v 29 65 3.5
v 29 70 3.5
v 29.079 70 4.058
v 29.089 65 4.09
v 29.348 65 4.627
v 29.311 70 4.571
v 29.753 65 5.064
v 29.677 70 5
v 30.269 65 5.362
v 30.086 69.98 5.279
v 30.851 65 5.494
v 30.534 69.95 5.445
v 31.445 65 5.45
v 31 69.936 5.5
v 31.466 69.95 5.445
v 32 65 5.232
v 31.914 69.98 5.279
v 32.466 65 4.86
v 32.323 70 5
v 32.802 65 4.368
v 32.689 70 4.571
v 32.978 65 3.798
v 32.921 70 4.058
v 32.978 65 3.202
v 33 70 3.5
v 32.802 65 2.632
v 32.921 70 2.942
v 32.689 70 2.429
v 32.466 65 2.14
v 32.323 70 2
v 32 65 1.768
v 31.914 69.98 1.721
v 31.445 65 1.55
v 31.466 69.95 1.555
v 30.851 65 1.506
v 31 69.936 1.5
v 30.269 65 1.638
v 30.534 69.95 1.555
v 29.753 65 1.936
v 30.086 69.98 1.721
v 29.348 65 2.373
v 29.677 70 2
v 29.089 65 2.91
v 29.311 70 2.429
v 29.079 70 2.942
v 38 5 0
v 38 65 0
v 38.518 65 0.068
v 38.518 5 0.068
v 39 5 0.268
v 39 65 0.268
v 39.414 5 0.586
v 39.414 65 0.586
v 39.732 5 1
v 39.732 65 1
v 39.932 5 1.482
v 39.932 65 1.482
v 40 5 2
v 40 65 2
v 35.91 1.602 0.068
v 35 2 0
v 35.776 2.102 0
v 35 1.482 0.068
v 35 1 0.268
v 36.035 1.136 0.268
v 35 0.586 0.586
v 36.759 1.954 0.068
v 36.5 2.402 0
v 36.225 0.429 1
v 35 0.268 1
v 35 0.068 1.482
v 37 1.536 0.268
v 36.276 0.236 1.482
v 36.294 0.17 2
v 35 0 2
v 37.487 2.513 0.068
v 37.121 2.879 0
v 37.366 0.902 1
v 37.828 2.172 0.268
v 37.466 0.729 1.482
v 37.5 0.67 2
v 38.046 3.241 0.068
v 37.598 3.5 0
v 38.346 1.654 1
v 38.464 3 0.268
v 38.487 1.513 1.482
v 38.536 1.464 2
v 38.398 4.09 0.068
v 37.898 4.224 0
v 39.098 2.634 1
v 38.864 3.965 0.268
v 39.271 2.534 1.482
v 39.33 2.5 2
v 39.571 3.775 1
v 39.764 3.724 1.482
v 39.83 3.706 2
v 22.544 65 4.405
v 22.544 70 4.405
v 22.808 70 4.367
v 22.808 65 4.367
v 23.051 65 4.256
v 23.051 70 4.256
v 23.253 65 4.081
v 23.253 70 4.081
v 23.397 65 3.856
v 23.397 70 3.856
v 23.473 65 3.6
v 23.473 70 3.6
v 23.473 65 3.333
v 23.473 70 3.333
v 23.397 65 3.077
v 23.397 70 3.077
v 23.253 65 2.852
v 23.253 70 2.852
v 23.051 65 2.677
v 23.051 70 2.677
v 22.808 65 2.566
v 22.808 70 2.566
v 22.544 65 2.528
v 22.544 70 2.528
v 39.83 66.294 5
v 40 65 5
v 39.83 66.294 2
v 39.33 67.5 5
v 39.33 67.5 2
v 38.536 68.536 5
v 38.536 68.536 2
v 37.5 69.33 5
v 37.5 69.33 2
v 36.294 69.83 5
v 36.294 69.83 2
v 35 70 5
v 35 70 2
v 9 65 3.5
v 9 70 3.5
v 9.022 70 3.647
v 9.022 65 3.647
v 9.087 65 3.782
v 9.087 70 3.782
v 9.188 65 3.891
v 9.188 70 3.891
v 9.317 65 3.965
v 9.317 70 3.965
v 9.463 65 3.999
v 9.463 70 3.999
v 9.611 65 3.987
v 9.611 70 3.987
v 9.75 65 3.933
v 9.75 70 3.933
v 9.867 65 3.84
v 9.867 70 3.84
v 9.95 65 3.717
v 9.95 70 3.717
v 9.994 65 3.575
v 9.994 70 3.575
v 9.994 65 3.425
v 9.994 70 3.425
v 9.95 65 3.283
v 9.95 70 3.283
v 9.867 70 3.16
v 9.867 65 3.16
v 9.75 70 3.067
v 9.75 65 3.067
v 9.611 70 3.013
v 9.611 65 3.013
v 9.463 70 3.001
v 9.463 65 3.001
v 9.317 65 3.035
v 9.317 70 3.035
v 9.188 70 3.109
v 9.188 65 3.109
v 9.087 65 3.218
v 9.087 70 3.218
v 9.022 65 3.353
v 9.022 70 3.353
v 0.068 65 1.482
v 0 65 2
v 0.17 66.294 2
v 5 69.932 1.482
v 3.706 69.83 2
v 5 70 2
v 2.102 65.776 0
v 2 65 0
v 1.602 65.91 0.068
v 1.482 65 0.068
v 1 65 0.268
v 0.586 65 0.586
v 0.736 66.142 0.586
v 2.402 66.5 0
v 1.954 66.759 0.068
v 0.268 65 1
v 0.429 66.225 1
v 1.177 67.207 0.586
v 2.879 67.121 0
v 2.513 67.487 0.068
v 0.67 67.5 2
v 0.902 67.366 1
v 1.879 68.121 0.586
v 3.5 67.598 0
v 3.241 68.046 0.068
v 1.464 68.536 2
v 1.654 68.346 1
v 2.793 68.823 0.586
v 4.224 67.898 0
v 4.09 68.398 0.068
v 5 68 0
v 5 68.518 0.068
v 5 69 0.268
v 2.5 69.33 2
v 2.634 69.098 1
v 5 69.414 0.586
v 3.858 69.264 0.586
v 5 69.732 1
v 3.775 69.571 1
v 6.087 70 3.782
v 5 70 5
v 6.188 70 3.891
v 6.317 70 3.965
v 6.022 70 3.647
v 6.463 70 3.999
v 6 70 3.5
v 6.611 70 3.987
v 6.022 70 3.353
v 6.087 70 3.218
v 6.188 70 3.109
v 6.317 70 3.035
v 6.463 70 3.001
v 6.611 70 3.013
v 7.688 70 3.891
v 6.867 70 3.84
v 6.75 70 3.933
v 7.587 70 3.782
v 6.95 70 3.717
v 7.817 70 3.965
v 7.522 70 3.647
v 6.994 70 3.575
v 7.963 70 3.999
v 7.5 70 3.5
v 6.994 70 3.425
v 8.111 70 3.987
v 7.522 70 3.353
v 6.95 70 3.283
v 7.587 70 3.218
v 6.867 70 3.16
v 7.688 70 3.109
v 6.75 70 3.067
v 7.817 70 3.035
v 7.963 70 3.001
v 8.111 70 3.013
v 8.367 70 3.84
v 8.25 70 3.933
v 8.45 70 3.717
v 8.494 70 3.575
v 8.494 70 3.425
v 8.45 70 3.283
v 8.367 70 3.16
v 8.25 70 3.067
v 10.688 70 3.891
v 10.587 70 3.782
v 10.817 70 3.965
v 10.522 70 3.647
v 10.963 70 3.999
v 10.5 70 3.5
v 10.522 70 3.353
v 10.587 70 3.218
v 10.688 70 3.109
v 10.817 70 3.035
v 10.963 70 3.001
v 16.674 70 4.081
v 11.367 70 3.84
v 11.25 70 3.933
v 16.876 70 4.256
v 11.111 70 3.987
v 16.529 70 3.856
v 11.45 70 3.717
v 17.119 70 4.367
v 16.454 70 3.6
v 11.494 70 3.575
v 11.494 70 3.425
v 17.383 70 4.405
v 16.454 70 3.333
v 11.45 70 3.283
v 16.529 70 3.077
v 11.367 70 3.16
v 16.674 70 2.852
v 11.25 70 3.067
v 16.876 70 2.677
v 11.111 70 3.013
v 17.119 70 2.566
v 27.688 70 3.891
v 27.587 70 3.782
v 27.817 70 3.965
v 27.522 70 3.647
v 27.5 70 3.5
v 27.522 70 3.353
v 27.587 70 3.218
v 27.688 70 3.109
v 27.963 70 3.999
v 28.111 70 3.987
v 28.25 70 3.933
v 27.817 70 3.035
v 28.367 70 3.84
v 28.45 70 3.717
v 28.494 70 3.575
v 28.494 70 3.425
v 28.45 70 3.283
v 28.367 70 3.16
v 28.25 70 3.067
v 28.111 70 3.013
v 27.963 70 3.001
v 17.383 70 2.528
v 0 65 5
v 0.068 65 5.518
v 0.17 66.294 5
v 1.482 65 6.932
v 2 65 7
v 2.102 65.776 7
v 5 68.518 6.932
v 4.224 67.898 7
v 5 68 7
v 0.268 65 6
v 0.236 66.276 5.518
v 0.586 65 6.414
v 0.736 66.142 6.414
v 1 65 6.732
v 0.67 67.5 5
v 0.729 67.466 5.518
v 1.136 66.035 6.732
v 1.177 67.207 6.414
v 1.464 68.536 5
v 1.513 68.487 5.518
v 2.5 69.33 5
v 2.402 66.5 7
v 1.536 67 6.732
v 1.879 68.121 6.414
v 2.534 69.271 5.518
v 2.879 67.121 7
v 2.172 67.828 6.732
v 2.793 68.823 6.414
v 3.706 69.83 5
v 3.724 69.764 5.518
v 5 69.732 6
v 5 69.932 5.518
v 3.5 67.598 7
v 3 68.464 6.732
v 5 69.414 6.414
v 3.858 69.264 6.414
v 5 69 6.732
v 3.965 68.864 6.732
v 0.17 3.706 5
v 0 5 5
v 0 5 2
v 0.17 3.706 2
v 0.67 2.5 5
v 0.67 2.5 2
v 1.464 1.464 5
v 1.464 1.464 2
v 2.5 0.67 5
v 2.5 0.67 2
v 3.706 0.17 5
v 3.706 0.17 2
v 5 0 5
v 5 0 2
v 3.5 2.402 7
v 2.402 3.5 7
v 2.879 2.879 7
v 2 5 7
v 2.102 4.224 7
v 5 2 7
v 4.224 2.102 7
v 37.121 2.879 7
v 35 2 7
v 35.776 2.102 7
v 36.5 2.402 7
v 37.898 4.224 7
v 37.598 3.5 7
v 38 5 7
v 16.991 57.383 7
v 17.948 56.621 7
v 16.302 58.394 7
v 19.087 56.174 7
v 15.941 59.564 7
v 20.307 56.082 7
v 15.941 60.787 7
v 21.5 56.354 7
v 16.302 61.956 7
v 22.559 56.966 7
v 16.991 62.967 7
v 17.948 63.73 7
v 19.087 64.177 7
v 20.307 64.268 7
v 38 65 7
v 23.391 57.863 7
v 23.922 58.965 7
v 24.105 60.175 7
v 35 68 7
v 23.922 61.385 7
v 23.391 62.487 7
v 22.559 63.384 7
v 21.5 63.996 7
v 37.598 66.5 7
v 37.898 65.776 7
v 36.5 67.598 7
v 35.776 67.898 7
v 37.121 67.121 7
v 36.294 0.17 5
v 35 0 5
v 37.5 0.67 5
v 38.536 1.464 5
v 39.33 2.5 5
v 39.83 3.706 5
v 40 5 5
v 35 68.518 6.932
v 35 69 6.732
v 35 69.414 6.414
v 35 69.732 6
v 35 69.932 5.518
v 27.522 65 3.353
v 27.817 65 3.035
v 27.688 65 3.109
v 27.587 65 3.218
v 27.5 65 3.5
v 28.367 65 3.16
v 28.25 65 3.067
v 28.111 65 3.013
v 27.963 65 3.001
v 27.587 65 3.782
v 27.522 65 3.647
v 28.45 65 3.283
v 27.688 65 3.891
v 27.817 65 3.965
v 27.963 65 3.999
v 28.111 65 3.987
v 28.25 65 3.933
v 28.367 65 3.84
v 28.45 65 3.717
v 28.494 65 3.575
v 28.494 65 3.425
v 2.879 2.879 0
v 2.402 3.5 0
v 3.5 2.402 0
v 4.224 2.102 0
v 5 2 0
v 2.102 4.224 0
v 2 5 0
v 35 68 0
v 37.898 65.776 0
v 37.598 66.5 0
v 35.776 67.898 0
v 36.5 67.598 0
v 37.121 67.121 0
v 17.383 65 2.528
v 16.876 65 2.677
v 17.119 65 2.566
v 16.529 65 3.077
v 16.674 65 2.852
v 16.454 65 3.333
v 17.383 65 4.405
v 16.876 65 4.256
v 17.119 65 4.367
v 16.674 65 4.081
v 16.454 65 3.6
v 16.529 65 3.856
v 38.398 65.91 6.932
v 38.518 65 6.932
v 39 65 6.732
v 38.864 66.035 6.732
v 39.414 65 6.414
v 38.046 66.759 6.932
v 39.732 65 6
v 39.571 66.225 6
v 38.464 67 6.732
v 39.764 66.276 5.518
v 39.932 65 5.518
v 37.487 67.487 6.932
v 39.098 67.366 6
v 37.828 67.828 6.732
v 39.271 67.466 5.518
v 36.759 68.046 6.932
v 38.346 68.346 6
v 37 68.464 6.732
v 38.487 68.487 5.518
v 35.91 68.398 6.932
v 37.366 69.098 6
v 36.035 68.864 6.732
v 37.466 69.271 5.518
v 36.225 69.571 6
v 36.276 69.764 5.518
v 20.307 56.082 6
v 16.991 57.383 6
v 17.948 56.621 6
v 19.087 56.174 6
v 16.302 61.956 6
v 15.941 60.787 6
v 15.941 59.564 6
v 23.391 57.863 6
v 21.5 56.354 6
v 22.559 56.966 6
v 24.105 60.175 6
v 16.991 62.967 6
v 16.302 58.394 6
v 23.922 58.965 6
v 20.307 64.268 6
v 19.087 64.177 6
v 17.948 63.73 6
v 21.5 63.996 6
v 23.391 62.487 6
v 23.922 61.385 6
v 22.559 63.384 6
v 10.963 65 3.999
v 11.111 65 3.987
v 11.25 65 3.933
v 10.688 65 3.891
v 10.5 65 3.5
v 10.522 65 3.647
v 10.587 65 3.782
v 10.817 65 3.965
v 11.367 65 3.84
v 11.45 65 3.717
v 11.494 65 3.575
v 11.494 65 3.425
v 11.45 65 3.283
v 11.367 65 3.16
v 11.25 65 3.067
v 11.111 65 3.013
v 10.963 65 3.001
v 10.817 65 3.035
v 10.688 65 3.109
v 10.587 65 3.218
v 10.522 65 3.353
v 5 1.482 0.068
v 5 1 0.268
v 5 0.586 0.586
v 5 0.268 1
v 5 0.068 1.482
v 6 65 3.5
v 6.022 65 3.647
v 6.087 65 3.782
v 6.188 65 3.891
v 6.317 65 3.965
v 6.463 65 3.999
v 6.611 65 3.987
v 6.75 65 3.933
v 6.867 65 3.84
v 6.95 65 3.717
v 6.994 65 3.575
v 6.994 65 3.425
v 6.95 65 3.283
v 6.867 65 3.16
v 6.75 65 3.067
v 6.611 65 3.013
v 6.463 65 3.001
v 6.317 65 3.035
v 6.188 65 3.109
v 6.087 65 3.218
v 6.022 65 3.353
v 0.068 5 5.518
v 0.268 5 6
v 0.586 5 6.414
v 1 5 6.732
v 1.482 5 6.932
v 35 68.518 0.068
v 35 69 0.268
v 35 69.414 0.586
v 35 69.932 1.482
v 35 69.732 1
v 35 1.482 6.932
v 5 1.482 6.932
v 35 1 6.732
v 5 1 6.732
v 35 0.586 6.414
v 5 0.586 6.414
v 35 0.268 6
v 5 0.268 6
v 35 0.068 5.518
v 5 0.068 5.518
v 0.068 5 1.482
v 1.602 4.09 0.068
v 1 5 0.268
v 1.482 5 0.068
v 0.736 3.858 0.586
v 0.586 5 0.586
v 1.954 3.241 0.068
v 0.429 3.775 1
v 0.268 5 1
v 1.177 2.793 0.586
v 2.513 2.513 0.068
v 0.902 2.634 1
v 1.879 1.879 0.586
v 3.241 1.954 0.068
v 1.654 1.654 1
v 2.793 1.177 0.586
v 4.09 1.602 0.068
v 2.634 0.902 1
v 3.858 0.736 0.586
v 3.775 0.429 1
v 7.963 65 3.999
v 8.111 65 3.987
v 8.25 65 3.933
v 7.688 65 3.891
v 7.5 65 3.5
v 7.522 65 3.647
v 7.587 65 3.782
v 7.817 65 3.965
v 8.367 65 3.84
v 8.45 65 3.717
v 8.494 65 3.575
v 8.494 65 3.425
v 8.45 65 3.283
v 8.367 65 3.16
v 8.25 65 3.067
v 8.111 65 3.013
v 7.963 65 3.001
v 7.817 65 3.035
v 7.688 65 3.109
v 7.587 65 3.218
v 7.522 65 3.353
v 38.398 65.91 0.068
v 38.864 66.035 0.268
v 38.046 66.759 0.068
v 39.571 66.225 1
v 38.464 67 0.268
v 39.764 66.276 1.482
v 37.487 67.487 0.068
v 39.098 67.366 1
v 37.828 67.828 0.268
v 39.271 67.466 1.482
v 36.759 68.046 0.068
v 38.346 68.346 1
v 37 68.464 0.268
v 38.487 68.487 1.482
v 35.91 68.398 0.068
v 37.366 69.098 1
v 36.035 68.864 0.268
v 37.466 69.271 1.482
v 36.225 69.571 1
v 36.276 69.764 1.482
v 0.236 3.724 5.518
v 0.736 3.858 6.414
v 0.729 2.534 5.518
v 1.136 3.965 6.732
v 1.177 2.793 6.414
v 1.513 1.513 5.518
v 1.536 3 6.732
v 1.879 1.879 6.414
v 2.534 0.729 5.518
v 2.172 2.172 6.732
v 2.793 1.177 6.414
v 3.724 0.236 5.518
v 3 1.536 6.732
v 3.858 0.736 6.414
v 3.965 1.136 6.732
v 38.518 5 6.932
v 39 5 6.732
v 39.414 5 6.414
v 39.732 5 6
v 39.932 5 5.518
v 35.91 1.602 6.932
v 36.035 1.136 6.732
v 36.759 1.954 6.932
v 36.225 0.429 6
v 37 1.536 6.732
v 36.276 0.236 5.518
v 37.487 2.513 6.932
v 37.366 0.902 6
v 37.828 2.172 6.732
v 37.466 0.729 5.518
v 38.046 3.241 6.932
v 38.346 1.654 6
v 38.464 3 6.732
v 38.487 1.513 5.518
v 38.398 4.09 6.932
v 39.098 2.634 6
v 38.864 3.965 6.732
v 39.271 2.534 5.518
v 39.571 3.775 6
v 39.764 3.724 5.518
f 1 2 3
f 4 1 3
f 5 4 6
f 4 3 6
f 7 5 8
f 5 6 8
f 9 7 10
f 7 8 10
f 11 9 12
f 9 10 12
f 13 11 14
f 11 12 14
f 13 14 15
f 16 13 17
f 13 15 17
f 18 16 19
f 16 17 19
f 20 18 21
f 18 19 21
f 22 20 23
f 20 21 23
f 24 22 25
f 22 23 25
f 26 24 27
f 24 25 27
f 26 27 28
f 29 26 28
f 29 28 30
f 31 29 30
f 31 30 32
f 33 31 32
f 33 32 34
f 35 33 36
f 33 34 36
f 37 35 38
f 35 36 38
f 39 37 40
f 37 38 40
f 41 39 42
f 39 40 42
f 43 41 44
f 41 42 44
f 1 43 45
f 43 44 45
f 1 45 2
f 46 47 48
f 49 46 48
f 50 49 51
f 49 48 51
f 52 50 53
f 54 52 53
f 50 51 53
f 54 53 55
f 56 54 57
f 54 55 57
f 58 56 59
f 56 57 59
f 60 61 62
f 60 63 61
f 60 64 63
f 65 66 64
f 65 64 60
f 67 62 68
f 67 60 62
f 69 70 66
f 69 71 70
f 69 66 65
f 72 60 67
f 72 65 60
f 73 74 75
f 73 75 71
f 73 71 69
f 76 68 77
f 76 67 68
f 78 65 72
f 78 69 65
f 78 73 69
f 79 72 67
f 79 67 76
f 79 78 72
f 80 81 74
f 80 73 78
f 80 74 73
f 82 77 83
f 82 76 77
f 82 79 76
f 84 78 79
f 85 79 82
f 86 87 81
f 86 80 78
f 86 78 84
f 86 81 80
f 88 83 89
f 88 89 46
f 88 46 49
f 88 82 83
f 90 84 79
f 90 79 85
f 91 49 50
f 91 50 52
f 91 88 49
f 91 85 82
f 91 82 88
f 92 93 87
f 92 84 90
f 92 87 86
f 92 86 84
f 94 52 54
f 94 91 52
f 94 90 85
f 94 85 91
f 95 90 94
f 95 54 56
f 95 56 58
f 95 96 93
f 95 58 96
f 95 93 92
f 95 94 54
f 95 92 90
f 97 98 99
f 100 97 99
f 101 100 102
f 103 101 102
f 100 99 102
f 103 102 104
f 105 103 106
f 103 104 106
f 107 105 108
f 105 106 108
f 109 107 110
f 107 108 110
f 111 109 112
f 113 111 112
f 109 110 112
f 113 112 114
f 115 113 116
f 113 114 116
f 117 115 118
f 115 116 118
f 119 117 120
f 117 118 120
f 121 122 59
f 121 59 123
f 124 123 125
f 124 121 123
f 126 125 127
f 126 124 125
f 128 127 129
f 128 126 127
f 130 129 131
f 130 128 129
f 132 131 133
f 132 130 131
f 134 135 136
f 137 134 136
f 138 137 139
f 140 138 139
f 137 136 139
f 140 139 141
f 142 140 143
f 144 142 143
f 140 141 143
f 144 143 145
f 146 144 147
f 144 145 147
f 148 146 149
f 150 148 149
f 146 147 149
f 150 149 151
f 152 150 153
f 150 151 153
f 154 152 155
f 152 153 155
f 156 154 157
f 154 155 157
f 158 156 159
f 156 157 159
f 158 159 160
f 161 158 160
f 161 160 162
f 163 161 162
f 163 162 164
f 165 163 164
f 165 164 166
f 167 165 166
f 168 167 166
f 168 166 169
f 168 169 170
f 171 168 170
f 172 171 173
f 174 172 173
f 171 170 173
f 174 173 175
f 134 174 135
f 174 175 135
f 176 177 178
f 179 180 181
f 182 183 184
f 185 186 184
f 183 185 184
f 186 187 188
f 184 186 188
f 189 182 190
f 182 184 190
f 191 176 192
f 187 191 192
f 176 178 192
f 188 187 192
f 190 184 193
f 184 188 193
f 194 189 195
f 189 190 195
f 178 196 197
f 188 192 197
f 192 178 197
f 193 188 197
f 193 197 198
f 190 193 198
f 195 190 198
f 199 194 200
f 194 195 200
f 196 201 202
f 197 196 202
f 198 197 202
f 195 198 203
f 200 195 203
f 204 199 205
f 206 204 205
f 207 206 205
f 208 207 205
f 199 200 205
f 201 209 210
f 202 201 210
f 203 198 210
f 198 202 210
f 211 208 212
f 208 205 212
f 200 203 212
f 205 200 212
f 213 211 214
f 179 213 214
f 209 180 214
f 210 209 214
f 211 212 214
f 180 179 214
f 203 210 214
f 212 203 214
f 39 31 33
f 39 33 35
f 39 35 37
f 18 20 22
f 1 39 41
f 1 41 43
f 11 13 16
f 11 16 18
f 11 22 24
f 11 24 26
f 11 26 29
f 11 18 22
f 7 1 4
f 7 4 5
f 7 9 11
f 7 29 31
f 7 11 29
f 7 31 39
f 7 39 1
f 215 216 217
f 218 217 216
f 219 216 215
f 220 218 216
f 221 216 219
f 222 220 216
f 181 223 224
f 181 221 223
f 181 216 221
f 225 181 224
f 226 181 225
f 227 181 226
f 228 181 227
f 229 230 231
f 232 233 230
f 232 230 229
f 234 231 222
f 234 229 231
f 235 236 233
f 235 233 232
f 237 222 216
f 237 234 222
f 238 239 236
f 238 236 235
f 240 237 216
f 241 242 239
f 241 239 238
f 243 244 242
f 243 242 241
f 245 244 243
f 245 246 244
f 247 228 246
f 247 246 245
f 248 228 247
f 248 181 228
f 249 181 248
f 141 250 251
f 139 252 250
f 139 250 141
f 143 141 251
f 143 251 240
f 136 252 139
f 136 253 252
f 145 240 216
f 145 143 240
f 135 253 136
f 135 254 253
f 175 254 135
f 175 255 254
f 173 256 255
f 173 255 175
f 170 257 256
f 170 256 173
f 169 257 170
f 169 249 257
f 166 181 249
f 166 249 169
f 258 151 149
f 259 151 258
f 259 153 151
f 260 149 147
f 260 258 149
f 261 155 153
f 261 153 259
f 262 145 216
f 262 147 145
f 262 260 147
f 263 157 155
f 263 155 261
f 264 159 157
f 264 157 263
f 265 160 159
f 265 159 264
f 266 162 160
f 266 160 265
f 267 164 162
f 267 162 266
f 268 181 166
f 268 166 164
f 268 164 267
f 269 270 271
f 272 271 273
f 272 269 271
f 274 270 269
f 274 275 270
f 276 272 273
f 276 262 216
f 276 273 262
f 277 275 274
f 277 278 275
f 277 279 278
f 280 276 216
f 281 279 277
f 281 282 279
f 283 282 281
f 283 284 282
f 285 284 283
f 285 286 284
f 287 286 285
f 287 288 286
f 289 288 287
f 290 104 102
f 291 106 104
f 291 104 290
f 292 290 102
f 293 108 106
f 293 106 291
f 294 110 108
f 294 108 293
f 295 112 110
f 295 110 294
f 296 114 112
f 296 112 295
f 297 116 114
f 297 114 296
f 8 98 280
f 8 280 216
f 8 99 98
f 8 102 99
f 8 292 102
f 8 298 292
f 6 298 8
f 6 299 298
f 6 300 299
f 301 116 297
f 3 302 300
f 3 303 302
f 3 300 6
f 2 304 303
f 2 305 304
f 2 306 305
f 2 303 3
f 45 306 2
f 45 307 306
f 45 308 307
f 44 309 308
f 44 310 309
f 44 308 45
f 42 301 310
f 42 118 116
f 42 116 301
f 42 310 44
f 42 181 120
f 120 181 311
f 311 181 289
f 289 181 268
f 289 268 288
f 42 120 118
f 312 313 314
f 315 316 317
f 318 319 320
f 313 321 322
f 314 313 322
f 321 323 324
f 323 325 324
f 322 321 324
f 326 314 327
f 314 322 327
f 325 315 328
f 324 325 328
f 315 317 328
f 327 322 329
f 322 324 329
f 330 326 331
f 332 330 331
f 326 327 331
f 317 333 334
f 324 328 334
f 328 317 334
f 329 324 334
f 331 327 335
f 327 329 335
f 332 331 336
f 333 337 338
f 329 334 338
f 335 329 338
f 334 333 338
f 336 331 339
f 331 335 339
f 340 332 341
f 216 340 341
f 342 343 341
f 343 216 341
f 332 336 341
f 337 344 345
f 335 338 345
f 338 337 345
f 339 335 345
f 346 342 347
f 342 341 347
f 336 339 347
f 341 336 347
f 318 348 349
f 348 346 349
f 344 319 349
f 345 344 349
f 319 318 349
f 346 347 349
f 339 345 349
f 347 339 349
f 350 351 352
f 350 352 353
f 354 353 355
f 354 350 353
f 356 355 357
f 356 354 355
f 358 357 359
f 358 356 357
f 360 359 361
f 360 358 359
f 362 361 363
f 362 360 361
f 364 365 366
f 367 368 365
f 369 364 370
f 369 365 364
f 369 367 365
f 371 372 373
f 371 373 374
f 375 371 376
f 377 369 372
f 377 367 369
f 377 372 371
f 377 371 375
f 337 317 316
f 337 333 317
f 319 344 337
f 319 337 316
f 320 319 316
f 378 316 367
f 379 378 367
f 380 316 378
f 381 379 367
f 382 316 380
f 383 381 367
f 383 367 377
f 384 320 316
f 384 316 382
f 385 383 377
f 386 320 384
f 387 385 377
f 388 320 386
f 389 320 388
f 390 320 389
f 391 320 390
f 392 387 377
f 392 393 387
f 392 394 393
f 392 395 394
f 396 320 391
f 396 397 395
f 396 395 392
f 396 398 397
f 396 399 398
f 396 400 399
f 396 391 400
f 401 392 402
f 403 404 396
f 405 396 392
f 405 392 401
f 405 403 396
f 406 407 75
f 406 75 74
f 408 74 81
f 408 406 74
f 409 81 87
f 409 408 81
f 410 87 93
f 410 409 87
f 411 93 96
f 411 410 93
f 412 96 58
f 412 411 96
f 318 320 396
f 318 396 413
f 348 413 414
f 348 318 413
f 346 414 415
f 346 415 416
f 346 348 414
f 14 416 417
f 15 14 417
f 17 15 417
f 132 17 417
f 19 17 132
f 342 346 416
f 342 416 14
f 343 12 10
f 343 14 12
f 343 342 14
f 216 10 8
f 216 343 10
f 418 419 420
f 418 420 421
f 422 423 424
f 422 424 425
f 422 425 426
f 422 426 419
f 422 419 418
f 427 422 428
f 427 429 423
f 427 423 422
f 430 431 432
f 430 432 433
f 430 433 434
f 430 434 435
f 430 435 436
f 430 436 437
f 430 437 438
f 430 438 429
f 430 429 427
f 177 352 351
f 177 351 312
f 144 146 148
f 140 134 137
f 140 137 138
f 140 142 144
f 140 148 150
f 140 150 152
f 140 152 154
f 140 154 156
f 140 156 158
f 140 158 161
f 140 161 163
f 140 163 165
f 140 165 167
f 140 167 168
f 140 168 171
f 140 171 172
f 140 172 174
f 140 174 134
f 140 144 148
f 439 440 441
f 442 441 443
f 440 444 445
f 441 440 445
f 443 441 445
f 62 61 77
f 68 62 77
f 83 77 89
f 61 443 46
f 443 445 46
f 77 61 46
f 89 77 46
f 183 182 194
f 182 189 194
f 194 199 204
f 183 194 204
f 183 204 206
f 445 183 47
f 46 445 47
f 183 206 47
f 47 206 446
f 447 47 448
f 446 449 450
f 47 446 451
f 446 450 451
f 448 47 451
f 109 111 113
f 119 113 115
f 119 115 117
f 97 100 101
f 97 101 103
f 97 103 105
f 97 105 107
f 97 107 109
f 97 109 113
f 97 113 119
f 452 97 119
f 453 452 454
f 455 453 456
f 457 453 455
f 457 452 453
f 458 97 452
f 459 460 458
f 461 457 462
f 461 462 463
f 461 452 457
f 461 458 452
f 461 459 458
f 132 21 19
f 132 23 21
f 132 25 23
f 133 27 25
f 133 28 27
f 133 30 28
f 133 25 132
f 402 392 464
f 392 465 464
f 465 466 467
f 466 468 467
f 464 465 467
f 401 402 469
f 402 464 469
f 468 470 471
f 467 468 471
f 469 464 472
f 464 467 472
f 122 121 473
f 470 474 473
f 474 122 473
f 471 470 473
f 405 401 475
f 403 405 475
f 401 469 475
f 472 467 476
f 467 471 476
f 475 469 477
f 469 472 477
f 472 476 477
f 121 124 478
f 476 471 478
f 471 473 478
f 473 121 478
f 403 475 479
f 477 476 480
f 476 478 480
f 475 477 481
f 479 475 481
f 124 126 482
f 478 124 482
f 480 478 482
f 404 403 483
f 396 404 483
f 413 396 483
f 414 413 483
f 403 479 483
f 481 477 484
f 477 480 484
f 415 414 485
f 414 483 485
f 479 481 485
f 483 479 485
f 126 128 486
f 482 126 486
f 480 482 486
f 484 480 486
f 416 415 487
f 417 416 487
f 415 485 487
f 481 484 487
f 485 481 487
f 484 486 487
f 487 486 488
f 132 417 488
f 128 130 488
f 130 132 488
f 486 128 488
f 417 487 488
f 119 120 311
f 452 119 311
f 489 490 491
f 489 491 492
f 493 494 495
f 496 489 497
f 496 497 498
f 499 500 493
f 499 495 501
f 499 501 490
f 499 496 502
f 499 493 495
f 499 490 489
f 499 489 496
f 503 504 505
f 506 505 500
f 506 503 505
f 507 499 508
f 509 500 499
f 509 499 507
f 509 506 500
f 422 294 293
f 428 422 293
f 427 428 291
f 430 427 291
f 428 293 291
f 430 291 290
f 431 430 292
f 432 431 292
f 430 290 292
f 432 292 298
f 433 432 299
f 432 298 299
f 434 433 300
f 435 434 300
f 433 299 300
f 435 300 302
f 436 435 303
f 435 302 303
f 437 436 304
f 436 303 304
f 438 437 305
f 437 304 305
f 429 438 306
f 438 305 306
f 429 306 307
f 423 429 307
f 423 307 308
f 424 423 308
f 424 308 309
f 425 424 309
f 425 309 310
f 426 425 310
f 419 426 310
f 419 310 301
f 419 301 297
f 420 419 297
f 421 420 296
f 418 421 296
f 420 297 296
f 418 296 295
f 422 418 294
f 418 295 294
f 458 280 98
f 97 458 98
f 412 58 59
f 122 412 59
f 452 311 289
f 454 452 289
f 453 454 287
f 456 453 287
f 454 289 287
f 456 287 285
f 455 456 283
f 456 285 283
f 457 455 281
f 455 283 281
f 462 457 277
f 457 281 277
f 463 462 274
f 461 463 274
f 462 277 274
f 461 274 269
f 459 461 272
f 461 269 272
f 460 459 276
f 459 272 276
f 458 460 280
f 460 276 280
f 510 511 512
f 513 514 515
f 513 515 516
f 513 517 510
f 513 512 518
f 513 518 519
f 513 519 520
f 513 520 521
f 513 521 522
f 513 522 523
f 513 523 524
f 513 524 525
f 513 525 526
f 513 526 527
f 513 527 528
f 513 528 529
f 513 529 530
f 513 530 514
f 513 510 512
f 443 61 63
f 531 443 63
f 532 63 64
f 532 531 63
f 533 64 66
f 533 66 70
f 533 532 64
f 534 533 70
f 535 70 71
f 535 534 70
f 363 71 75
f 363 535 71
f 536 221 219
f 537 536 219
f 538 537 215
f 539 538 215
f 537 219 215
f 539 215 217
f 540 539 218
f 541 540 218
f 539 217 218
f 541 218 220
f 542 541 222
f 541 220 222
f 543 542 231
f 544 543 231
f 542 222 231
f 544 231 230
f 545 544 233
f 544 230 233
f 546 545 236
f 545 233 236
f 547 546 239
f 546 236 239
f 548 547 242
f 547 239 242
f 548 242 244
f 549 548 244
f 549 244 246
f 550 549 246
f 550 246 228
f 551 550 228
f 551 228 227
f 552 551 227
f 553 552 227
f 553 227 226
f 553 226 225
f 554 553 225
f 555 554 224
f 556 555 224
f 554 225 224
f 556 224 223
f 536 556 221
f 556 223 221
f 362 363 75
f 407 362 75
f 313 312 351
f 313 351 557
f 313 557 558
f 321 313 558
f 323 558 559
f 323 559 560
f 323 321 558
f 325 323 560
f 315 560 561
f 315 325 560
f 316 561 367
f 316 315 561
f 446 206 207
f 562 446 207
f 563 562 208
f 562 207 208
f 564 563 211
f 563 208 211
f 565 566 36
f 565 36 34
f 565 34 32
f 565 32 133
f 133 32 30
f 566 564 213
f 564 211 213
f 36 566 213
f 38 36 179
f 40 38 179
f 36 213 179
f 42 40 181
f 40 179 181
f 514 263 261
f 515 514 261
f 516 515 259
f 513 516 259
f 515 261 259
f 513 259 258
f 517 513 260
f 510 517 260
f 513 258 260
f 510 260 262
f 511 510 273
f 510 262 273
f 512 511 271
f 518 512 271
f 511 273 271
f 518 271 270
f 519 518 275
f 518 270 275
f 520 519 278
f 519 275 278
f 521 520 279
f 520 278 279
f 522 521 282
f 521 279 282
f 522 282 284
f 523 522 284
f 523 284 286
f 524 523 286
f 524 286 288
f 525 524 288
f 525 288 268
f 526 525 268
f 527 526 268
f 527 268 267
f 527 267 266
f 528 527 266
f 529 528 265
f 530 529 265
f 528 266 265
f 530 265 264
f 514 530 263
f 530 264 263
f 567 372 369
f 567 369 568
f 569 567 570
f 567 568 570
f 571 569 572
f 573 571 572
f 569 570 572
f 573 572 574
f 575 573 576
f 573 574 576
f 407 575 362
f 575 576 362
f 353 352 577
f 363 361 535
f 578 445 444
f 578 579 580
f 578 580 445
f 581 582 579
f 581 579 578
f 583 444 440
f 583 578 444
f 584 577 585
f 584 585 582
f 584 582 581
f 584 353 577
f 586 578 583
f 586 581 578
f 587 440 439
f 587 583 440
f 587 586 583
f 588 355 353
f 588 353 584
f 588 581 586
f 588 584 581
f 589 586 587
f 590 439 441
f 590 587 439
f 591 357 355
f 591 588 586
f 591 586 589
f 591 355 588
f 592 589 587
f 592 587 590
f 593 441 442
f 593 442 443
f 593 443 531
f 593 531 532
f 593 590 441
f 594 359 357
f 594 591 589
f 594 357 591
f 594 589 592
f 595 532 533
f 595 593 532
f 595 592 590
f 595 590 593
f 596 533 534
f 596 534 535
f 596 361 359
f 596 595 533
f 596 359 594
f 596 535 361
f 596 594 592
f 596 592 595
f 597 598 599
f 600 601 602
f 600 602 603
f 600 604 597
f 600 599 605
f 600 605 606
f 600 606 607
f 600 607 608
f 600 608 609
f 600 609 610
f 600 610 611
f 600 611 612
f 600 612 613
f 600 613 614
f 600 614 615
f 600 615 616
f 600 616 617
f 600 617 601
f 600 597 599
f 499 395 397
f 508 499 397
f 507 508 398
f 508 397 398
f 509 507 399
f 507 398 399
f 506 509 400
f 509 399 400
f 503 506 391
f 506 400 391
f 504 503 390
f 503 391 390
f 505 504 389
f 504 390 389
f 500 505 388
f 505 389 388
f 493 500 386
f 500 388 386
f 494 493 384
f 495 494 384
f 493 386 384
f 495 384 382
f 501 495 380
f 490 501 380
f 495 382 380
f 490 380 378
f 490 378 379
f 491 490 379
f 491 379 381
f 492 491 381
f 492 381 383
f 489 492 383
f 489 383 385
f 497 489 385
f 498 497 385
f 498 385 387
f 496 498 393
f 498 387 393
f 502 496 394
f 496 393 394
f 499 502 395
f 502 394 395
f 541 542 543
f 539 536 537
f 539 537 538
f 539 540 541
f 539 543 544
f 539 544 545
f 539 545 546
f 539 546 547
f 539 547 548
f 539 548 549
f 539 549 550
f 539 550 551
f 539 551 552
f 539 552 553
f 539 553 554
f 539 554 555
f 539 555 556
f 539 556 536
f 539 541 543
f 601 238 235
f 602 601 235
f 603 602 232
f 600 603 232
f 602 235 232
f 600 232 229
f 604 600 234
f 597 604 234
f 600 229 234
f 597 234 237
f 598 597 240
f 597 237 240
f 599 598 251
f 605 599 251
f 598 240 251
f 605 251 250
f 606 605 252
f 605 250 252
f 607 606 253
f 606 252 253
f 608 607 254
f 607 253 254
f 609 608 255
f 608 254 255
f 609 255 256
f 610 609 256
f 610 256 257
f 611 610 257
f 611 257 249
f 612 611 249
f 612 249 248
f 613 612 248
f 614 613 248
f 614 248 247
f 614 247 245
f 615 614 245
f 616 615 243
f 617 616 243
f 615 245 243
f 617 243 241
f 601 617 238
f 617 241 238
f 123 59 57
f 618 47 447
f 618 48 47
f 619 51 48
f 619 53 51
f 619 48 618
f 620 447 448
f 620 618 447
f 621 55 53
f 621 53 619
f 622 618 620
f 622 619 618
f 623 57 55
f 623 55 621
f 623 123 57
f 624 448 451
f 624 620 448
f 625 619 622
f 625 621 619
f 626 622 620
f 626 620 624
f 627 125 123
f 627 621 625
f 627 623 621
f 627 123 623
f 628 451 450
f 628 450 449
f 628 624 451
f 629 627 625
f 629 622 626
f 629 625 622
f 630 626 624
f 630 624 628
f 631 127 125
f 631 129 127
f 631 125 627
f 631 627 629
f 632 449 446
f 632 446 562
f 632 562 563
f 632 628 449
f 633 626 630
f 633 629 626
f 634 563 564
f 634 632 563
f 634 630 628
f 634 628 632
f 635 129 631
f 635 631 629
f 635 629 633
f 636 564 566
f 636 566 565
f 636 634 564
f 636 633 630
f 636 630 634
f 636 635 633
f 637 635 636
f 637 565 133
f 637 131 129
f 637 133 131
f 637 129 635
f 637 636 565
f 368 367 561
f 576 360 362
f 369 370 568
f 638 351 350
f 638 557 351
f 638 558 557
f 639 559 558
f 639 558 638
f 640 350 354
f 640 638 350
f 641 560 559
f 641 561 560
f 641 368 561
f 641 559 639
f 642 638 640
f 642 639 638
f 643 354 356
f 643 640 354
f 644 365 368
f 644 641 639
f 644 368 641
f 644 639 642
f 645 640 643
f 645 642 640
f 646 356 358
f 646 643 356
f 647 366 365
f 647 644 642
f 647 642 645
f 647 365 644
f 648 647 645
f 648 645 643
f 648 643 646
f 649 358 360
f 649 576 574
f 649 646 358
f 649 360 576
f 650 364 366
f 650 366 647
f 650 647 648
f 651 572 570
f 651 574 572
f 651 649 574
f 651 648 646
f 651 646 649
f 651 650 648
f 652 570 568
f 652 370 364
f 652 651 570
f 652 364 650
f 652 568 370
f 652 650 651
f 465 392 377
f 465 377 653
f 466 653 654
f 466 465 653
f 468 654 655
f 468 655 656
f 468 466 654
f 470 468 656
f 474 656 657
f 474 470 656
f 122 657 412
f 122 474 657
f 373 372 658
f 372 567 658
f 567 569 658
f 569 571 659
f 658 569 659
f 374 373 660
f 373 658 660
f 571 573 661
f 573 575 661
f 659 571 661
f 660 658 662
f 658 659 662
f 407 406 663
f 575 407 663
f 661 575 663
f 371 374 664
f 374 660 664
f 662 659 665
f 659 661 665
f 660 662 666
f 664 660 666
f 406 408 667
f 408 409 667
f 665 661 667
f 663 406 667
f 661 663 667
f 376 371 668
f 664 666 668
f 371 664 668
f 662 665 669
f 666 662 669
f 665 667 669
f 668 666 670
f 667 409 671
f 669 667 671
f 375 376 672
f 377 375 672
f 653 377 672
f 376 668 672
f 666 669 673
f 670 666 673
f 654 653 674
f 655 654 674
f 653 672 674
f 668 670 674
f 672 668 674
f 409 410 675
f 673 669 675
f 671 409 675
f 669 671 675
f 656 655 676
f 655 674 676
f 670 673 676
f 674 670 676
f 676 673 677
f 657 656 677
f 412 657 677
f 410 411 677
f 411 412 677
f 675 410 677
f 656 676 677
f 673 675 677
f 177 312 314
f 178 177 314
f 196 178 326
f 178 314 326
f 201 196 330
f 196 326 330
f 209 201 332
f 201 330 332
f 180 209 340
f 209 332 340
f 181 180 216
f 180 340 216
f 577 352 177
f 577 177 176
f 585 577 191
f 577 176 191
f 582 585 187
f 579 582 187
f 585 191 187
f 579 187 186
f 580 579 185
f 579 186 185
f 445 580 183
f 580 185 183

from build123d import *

# Parameters (mm, degrees)
F0_W         = 40
F0_H         = 70
F1_DEPTH     = 7
F2_R         = 5
F3_R         = 2
F4_DEPTH     = 5
F5_T1_DEPTH  = 30
F5_T3_DEPTH  = 60
F5_T6_ANGLE  = 90
F5_T8_ANGLE  = 90
F5_T10_ANGLE = 90
F5_T12_ANGLE = 90
F5_T14_ANGLE = 90
F5_T16_ANGLE = 90
F5_T18_ANGLE = 90
F5_T20_ANGLE = 90
F6_R         = 4.1045895756
F7_DEPTH     = 1
F8_R         = 0.5
F9_DEPTH     = 5
F11_DEPTH    = 5
F12_R        = 0.5
F13_DEPTH    = 5


# Not quite as in the source:
# - a fillet or chamfer that OpenCascade refuses, or shapes differently, is made with other operations: its cross-section is extruded or revolved along the edge and cut away or added


with BuildPart() as f1:
    # F0 (on Top) → F1 (new body)
    with BuildSketch(Plane.XY):
        with Locations((20, 35)):
            Rectangle(F0_W, F0_H)
    extrude(amount=F1_DEPTH)

    # F2
    f2_edges = [f1.edges().sort_by_distance(p)[0] for p in [
        (40, 0, 3.5),
        (0, 0, 3.5),
        (40, 70, 3.5),
        (0, 70, 3.5),
    ]]
    fillet(f2_edges, radius=F2_R)

    # F3 (on face) → F4 (cut)
    with BuildSketch(Plane(origin=(0, 70, 0), x_dir=(-1, 0, 0), z_dir=(0, 1, 0))):
        with Locations((-31, 3.5)):
            Circle(F3_R)
    extrude(amount=-F4_DEPTH, mode=Mode.SUBTRACT)

    # F5: fillet of radius 2 on 16 edges, made by hand

    # F5_s2 → F5_t1 (cut)
    with BuildSketch(Plane.YZ.offset(5)):
        with BuildLine():
            ThreePointArc((68, 7), (69.4142135624, 6.4142135624), (70, 5))
            Line((70, 5), (70, 7))
            Line((70, 7), (68, 7))
        make_face()
        with BuildLine():
            ThreePointArc((68, 0), (69.4142135624, 0.5857864376), (70, 2))
            Line((70, 2), (70, 0))
            Line((70, 0), (68, 0))
        make_face()
        with BuildLine():
            ThreePointArc((2, 0), (0.5857864376, 0.5857864376), (0, 2))
            Line((0, 2), (0, 0))
            Line((0, 0), (2, 0))
        make_face()
        with BuildLine():
            ThreePointArc((2, 7), (0.5857864376, 6.4142135624), (0, 5))
            Line((0, 5), (0, 7))
            Line((0, 7), (2, 7))
        make_face()
    extrude(amount=F5_T1_DEPTH, mode=Mode.SUBTRACT)

    # F5_s4 → F5_t3 (cut)
    with BuildSketch(Plane.XZ.offset(-65)):
        with BuildLine():
            ThreePointArc((0, 2), (0.5857864376, 0.5857864376), (2, 0))
            Line((2, 0), (0, 0))
            Line((0, 0), (0, 2))
        make_face()
        with BuildLine():
            ThreePointArc((0, 5), (0.5857864376, 6.4142135624), (2, 7))
            Line((2, 7), (0, 7))
            Line((0, 7), (0, 5))
        make_face()
        with BuildLine():
            ThreePointArc((38, 0), (39.4142135624, 0.5857864376), (40, 2))
            Line((40, 2), (40, 0))
            Line((40, 0), (38, 0))
        make_face()
        with BuildLine():
            ThreePointArc((38, 7), (39.4142135624, 6.4142135624), (40, 5))
            Line((40, 5), (40, 7))
            Line((40, 7), (38, 7))
        make_face()
    extrude(amount=F5_T3_DEPTH, mode=Mode.SUBTRACT)

    # F5_s5 → F5_t6 (revolve, cut)
    with BuildSketch(Plane.XZ.offset(-65)):
        with BuildLine():
            ThreePointArc((2, 0), (0.5857864376, 0.5857864376), (0, 2))
            Line((0, 2), (0, 0))
            Line((0, 0), (2, 0))
        make_face()
    revolve(axis=Axis((5, 65, 0), (0, 0, -1)), revolution_arc=F5_T6_ANGLE, mode=Mode.SUBTRACT)

    # F5_s7 → F5_t8 (revolve, cut)
    with BuildSketch(Plane.XZ.offset(-5)):
        with BuildLine():
            ThreePointArc((2, 0), (0.5857864376, 0.5857864376), (0, 2))
            Line((0, 2), (0, 0))
            Line((0, 0), (2, 0))
        make_face()
    revolve(axis=Axis((5, 5, 0), (0, 0, 1)), revolution_arc=F5_T8_ANGLE, mode=Mode.SUBTRACT)

    # F5_s9 → F5_t10 (revolve, cut)
    with BuildSketch(Plane.XZ.offset(-65)):
        with BuildLine():
            ThreePointArc((38, 0), (39.4142135624, 0.5857864376), (40, 2))
            Line((40, 2), (40, 0))
            Line((40, 0), (38, 0))
        make_face()
    revolve(axis=Axis((35, 65, 0), (0, 0, 1)), revolution_arc=F5_T10_ANGLE, mode=Mode.SUBTRACT)

    # F5_s11 → F5_t12 (revolve, cut)
    with BuildSketch(Plane.YZ.offset(35)):
        with BuildLine():
            ThreePointArc((2, 0), (0.5857864376, 0.5857864376), (0, 2))
            Line((0, 2), (0, 0))
            Line((0, 0), (2, 0))
        make_face()
    revolve(axis=Axis((35, 5, 0), (0, 0, 1)), revolution_arc=F5_T12_ANGLE, mode=Mode.SUBTRACT)

    # F5_s13 → F5_t14 (revolve, cut)
    with BuildSketch(Plane.XZ.offset(-65)):
        with BuildLine():
            ThreePointArc((0, 5), (0.5857864376, 6.4142135624), (2, 7))
            Line((2, 7), (0, 7))
            Line((0, 7), (0, 5))
        make_face()
    revolve(axis=Axis((5, 65, 7), (0, 0, -1)), revolution_arc=F5_T14_ANGLE, mode=Mode.SUBTRACT)

    # F5_s15 → F5_t16 (revolve, cut)
    with BuildSketch(Plane.XZ.offset(-5)):
        with BuildLine():
            ThreePointArc((0, 5), (0.5857864376, 6.4142135624), (2, 7))
            Line((2, 7), (0, 7))
            Line((0, 7), (0, 5))
        make_face()
    revolve(axis=Axis((5, 5, 7), (0, 0, 1)), revolution_arc=F5_T16_ANGLE, mode=Mode.SUBTRACT)

    # F5_s17 → F5_t18 (revolve, cut)
    with BuildSketch(Plane.XZ.offset(-65)):
        with BuildLine():
            ThreePointArc((38, 7), (39.4142135624, 6.4142135624), (40, 5))
            Line((40, 5), (40, 7))
            Line((40, 7), (38, 7))
        make_face()
    revolve(axis=Axis((35, 65, 7), (0, 0, 1)), revolution_arc=F5_T18_ANGLE, mode=Mode.SUBTRACT)

    # F5_s19 → F5_t20 (revolve, cut)
    with BuildSketch(Plane.YZ.offset(35)):
        with BuildLine():
            ThreePointArc((2, 7), (0.5857864376, 6.4142135624), (0, 5))
            Line((0, 5), (0, 7))
            Line((0, 7), (2, 7))
        make_face()
    revolve(axis=Axis((35, 5, 7), (0, 0, 1)), revolution_arc=F5_T20_ANGLE, mode=Mode.SUBTRACT)

    # F6 (on face) → F7 (cut)
    with BuildSketch(Plane.XY.offset(7)):
        with Locations((20, 60.1752847433)):
            Circle(F6_R)
    extrude(amount=-F7_DEPTH, mode=Mode.SUBTRACT)

    # F8 (on face) → F9 (cut)
    with BuildSketch(Plane(origin=(0, 70, 0), x_dir=(-1, 0, 0), z_dir=(0, 1, 0))):
        with Locations((-28, 3.5)):
            Circle(F8_R)
    extrude(amount=-F9_DEPTH, mode=Mode.SUBTRACT)

    # F10 (on face) → F11 (cut)
    with BuildSketch(Plane(origin=(0, 70, 0), x_dir=(-1, 0, 0), z_dir=(0, 1, 0))):
        with BuildLine():
            Line((-17.383011058, 4.4047813863), (-22.5439444184, 4.4047813863))
            ThreePointArc((-22.5439444184, 4.4047813863), (-23.4822960338, 3.4664297709), (-22.5439444184, 2.5280781556))
            Line((-22.5439444184, 2.5280781556), (-17.383011058, 2.5280781556))
            ThreePointArc((-17.383011058, 2.5280781556), (-16.4446594426, 3.4664297709), (-17.383011058, 4.4047813863))
        make_face()
    extrude(amount=-F11_DEPTH, mode=Mode.SUBTRACT)

    # F12 (on face) → F13 (cut)
    with BuildSketch(Plane(origin=(0, 70, 0), x_dir=(-1, 0, 0), z_dir=(0, 1, 0))):
        with Locations((-6.5, 3.5)):
            Circle(F12_R)
        with Locations((-8, 3.5)):
            Circle(F12_R)
        with Locations((-9.5, 3.5)):
            Circle(F12_R)
        with Locations((-11, 3.5)):
            Circle(F12_R)
    extrude(amount=-F13_DEPTH, mode=Mode.SUBTRACT)


solid = f1.part
